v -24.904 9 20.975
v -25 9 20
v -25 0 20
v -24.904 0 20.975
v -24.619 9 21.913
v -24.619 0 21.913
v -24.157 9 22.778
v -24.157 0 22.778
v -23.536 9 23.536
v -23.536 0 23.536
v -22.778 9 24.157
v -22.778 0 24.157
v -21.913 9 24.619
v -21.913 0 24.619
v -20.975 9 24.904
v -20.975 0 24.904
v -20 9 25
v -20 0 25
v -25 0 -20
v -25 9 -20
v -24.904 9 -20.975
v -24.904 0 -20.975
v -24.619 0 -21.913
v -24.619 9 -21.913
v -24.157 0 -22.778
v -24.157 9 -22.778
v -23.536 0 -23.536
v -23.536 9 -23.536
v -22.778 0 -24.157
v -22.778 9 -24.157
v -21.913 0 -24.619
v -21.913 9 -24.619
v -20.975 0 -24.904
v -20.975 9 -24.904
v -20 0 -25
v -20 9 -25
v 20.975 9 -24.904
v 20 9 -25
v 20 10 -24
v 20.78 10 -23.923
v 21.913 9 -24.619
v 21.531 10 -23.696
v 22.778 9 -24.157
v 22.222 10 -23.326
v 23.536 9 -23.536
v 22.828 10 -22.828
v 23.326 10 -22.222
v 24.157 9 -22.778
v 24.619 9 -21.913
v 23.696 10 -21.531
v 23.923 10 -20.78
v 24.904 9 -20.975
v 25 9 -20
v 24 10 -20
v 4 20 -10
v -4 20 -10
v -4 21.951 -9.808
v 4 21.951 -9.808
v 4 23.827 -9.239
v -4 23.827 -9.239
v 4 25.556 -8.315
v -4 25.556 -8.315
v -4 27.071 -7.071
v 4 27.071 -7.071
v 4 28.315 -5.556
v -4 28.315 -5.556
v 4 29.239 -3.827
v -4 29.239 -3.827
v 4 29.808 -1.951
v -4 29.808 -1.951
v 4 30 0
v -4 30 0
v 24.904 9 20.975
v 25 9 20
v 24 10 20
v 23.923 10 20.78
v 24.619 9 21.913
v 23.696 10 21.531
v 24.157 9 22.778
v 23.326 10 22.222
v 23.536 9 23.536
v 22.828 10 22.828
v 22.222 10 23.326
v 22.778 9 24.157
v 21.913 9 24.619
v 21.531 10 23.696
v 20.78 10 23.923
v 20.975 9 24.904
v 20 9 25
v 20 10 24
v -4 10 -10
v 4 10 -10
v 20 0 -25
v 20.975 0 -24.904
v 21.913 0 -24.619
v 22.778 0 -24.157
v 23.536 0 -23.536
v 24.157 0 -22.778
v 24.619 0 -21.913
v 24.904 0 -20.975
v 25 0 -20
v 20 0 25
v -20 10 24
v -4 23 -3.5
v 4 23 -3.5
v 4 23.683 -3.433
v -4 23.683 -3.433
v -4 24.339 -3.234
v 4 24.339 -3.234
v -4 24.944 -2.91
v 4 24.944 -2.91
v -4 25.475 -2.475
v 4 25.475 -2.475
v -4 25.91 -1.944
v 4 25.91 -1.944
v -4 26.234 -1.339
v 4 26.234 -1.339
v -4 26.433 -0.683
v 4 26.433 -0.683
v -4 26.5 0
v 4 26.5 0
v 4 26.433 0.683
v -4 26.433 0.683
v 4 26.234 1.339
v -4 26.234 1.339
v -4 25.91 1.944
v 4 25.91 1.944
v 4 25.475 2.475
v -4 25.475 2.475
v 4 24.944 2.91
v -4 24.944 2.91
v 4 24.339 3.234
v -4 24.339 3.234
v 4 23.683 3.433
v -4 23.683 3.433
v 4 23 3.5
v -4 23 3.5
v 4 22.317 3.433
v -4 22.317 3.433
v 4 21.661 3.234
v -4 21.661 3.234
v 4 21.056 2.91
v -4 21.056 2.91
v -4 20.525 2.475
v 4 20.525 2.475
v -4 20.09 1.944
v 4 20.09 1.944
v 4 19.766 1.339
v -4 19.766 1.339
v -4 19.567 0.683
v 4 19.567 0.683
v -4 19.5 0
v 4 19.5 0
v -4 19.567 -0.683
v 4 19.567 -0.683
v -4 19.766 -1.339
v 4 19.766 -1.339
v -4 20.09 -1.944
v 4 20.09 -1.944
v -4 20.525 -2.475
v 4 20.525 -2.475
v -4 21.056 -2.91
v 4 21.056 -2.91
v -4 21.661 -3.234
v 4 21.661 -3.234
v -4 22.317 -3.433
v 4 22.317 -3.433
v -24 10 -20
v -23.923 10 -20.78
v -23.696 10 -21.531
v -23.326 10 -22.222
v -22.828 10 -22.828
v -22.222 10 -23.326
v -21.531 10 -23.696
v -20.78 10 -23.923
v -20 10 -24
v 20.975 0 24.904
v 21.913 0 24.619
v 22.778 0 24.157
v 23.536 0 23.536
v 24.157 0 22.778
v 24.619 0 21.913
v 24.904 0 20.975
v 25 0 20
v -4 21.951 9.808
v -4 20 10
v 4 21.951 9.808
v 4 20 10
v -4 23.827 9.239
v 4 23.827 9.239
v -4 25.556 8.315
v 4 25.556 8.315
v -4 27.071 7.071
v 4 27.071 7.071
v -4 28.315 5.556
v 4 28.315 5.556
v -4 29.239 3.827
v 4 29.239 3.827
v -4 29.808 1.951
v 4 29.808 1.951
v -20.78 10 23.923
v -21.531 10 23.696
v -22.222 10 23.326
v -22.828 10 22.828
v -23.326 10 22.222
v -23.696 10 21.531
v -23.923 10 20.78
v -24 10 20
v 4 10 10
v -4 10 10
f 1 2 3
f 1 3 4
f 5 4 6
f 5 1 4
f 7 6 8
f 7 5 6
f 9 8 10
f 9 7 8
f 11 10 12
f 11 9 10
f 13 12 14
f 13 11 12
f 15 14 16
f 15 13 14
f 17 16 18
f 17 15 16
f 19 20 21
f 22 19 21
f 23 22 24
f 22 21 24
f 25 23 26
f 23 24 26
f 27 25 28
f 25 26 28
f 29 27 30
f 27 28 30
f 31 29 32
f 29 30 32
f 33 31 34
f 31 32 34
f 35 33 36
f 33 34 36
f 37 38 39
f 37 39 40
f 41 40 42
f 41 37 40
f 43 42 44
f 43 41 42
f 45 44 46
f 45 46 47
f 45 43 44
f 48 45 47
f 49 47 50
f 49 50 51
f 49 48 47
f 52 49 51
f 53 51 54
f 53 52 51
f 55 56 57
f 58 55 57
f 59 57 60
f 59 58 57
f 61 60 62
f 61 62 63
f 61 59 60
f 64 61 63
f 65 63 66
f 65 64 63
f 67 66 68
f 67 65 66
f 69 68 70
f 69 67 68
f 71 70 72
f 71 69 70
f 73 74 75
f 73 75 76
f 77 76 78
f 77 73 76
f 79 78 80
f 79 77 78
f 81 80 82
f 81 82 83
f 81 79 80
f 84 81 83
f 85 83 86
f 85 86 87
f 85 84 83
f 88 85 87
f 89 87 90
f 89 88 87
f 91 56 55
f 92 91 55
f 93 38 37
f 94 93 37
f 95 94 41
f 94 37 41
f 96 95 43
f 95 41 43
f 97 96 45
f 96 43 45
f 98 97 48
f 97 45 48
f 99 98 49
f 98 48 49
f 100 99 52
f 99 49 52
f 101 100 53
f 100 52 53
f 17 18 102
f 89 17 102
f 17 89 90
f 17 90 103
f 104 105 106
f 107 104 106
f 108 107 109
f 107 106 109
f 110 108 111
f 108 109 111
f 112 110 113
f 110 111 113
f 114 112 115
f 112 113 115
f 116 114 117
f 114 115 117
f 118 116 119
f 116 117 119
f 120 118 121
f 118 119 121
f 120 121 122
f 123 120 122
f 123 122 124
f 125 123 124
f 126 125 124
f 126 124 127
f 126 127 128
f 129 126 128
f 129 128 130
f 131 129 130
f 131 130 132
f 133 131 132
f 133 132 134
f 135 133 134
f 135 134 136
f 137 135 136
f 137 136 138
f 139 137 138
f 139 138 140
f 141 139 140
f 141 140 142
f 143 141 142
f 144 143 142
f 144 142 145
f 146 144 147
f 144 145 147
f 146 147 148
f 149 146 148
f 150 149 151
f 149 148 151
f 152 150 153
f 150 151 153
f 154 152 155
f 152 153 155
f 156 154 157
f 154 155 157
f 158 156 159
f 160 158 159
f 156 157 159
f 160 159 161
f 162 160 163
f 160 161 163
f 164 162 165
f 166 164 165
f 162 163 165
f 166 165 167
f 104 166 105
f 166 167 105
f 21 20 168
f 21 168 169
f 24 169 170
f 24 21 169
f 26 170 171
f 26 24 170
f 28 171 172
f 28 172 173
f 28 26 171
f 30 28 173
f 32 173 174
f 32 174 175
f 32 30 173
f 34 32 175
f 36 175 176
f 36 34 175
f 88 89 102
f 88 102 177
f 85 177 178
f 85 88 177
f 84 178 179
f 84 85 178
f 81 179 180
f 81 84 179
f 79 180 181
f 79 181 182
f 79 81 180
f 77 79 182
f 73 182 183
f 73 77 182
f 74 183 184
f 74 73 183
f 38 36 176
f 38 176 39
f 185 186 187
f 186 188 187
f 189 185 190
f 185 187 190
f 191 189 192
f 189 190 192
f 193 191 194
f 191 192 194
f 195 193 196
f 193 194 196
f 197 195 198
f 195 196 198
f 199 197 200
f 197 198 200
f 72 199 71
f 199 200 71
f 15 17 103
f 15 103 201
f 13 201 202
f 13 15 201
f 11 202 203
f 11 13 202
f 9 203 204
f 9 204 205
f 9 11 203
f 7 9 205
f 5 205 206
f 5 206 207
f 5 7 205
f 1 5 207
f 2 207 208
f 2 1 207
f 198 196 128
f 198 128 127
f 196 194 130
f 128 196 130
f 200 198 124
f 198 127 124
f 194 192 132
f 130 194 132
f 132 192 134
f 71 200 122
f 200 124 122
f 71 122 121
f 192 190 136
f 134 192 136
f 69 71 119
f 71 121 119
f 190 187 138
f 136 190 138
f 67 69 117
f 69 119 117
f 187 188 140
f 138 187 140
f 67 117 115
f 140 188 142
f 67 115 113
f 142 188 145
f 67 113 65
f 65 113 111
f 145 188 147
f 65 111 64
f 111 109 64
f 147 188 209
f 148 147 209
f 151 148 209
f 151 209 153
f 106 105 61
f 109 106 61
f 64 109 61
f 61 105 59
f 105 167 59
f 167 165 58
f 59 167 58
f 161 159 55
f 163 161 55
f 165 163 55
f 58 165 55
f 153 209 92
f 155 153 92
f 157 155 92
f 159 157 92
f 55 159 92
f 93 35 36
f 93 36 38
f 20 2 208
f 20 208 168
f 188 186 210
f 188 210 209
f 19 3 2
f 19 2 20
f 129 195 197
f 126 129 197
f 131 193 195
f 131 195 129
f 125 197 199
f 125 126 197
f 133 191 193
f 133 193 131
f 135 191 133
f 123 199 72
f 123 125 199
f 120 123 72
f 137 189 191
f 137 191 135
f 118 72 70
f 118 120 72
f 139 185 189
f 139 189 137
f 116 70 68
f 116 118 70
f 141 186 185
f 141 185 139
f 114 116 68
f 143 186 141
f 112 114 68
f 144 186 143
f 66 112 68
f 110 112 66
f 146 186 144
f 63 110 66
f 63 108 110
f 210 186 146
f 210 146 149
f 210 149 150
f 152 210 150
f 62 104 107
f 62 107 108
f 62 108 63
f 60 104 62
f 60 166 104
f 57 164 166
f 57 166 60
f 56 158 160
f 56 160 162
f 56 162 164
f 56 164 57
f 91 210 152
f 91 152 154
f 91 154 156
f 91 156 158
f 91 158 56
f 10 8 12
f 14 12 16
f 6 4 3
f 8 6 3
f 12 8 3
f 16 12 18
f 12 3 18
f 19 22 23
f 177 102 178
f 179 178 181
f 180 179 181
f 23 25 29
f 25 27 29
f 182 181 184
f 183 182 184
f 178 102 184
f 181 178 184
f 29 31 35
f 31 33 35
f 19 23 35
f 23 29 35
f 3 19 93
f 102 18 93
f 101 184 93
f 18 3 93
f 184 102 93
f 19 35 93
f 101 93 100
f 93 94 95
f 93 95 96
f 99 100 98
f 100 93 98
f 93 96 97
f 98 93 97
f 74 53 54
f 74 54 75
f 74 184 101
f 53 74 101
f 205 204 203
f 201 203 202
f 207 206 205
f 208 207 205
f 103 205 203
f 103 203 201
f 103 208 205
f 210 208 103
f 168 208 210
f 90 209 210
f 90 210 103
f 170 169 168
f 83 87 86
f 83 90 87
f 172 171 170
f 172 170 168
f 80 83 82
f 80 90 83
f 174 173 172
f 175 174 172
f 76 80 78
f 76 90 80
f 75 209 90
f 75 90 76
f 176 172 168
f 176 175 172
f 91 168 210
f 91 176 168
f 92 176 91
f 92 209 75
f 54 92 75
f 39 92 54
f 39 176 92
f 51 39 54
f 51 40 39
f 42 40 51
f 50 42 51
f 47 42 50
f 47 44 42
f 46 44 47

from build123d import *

# Parameters (mm, degrees)
CROQUIS1_W              = 50
CROQUIS1_H              = 50
SALIENTE_EXTRUIR1_DEPTH = 10
CROQUIS2_W              = 8
CROQUIS2_H              = 20
SALIENTE_EXTRUIR2_DEPTH = 20
CROQUIS3_R              = 3.5
CORTAR_EXTRUIR1_DEPTH   = 49.641546028
REDONDEO1_R             = 10
REDONDEO2_R             = 5
CHAFL_N1_SIZE           = 1


with BuildPart() as part:
    # Croquis1 → Saliente-Extruir1 (new body)
    with BuildSketch(Plane(origin=(0, 0, 0), x_dir=(1, 0, 0), z_dir=(0, 1, 0))):
        Rectangle(CROQUIS1_W, CROQUIS1_H)
    extrude(amount=SALIENTE_EXTRUIR1_DEPTH)

    # Croquis2 → Saliente-Extruir2 (add)
    with BuildSketch(Plane(origin=(0, 10, 0), x_dir=(1, 0, 0), z_dir=(0, 1, 0))):
        Rectangle(CROQUIS2_W, CROQUIS2_H)
    extrude(amount=SALIENTE_EXTRUIR2_DEPTH)

    # Croquis3 → Cortar-Extruir1 (cut, through all)
    with BuildSketch(Plane(origin=(4, 0, 0), x_dir=(0, 0, -1), z_dir=(1, 0, 0))):
        with Locations((0, 23)):
            Circle(CROQUIS3_R)
    extrude(amount=-CORTAR_EXTRUIR1_DEPTH, mode=Mode.SUBTRACT)

    # Redondeo1
    redondeo1_edges = [part.edges().sort_by_distance(p)[0] for p in [
        (0, 30, -10),
        (0, 30, 10),
    ]]
    fillet(redondeo1_edges, radius=REDONDEO1_R - 0.0001)  # a hair under: the kernel refuses the full size

    # Redondeo2
    redondeo2_edges = [part.edges().sort_by_distance(p)[0] for p in [
        (25, 5, 25),
        (-25, 5, 25),
        (-25, 5, -25),
        (25, 5, -25),
    ]]
    fillet(redondeo2_edges, radius=REDONDEO2_R)

    # Chaflán1
    chafl_n1_edges = [part.edges().sort_by_distance(p)[0] for p in [
        (-25, 10, 0),
        (0, 10, -25),
        (25, 10, 0),
        (0, 10, 25),
        (-23.535533906, 10, 23.535533906),
        (23.535533906, 10, 23.535533906),
        (23.535533906, 10, -23.535533906),
        (-23.535533906, 10, -23.535533906),
    ]]
    chamfer(chafl_n1_edges, length=CHAFL_N1_SIZE)


solid = part.part
